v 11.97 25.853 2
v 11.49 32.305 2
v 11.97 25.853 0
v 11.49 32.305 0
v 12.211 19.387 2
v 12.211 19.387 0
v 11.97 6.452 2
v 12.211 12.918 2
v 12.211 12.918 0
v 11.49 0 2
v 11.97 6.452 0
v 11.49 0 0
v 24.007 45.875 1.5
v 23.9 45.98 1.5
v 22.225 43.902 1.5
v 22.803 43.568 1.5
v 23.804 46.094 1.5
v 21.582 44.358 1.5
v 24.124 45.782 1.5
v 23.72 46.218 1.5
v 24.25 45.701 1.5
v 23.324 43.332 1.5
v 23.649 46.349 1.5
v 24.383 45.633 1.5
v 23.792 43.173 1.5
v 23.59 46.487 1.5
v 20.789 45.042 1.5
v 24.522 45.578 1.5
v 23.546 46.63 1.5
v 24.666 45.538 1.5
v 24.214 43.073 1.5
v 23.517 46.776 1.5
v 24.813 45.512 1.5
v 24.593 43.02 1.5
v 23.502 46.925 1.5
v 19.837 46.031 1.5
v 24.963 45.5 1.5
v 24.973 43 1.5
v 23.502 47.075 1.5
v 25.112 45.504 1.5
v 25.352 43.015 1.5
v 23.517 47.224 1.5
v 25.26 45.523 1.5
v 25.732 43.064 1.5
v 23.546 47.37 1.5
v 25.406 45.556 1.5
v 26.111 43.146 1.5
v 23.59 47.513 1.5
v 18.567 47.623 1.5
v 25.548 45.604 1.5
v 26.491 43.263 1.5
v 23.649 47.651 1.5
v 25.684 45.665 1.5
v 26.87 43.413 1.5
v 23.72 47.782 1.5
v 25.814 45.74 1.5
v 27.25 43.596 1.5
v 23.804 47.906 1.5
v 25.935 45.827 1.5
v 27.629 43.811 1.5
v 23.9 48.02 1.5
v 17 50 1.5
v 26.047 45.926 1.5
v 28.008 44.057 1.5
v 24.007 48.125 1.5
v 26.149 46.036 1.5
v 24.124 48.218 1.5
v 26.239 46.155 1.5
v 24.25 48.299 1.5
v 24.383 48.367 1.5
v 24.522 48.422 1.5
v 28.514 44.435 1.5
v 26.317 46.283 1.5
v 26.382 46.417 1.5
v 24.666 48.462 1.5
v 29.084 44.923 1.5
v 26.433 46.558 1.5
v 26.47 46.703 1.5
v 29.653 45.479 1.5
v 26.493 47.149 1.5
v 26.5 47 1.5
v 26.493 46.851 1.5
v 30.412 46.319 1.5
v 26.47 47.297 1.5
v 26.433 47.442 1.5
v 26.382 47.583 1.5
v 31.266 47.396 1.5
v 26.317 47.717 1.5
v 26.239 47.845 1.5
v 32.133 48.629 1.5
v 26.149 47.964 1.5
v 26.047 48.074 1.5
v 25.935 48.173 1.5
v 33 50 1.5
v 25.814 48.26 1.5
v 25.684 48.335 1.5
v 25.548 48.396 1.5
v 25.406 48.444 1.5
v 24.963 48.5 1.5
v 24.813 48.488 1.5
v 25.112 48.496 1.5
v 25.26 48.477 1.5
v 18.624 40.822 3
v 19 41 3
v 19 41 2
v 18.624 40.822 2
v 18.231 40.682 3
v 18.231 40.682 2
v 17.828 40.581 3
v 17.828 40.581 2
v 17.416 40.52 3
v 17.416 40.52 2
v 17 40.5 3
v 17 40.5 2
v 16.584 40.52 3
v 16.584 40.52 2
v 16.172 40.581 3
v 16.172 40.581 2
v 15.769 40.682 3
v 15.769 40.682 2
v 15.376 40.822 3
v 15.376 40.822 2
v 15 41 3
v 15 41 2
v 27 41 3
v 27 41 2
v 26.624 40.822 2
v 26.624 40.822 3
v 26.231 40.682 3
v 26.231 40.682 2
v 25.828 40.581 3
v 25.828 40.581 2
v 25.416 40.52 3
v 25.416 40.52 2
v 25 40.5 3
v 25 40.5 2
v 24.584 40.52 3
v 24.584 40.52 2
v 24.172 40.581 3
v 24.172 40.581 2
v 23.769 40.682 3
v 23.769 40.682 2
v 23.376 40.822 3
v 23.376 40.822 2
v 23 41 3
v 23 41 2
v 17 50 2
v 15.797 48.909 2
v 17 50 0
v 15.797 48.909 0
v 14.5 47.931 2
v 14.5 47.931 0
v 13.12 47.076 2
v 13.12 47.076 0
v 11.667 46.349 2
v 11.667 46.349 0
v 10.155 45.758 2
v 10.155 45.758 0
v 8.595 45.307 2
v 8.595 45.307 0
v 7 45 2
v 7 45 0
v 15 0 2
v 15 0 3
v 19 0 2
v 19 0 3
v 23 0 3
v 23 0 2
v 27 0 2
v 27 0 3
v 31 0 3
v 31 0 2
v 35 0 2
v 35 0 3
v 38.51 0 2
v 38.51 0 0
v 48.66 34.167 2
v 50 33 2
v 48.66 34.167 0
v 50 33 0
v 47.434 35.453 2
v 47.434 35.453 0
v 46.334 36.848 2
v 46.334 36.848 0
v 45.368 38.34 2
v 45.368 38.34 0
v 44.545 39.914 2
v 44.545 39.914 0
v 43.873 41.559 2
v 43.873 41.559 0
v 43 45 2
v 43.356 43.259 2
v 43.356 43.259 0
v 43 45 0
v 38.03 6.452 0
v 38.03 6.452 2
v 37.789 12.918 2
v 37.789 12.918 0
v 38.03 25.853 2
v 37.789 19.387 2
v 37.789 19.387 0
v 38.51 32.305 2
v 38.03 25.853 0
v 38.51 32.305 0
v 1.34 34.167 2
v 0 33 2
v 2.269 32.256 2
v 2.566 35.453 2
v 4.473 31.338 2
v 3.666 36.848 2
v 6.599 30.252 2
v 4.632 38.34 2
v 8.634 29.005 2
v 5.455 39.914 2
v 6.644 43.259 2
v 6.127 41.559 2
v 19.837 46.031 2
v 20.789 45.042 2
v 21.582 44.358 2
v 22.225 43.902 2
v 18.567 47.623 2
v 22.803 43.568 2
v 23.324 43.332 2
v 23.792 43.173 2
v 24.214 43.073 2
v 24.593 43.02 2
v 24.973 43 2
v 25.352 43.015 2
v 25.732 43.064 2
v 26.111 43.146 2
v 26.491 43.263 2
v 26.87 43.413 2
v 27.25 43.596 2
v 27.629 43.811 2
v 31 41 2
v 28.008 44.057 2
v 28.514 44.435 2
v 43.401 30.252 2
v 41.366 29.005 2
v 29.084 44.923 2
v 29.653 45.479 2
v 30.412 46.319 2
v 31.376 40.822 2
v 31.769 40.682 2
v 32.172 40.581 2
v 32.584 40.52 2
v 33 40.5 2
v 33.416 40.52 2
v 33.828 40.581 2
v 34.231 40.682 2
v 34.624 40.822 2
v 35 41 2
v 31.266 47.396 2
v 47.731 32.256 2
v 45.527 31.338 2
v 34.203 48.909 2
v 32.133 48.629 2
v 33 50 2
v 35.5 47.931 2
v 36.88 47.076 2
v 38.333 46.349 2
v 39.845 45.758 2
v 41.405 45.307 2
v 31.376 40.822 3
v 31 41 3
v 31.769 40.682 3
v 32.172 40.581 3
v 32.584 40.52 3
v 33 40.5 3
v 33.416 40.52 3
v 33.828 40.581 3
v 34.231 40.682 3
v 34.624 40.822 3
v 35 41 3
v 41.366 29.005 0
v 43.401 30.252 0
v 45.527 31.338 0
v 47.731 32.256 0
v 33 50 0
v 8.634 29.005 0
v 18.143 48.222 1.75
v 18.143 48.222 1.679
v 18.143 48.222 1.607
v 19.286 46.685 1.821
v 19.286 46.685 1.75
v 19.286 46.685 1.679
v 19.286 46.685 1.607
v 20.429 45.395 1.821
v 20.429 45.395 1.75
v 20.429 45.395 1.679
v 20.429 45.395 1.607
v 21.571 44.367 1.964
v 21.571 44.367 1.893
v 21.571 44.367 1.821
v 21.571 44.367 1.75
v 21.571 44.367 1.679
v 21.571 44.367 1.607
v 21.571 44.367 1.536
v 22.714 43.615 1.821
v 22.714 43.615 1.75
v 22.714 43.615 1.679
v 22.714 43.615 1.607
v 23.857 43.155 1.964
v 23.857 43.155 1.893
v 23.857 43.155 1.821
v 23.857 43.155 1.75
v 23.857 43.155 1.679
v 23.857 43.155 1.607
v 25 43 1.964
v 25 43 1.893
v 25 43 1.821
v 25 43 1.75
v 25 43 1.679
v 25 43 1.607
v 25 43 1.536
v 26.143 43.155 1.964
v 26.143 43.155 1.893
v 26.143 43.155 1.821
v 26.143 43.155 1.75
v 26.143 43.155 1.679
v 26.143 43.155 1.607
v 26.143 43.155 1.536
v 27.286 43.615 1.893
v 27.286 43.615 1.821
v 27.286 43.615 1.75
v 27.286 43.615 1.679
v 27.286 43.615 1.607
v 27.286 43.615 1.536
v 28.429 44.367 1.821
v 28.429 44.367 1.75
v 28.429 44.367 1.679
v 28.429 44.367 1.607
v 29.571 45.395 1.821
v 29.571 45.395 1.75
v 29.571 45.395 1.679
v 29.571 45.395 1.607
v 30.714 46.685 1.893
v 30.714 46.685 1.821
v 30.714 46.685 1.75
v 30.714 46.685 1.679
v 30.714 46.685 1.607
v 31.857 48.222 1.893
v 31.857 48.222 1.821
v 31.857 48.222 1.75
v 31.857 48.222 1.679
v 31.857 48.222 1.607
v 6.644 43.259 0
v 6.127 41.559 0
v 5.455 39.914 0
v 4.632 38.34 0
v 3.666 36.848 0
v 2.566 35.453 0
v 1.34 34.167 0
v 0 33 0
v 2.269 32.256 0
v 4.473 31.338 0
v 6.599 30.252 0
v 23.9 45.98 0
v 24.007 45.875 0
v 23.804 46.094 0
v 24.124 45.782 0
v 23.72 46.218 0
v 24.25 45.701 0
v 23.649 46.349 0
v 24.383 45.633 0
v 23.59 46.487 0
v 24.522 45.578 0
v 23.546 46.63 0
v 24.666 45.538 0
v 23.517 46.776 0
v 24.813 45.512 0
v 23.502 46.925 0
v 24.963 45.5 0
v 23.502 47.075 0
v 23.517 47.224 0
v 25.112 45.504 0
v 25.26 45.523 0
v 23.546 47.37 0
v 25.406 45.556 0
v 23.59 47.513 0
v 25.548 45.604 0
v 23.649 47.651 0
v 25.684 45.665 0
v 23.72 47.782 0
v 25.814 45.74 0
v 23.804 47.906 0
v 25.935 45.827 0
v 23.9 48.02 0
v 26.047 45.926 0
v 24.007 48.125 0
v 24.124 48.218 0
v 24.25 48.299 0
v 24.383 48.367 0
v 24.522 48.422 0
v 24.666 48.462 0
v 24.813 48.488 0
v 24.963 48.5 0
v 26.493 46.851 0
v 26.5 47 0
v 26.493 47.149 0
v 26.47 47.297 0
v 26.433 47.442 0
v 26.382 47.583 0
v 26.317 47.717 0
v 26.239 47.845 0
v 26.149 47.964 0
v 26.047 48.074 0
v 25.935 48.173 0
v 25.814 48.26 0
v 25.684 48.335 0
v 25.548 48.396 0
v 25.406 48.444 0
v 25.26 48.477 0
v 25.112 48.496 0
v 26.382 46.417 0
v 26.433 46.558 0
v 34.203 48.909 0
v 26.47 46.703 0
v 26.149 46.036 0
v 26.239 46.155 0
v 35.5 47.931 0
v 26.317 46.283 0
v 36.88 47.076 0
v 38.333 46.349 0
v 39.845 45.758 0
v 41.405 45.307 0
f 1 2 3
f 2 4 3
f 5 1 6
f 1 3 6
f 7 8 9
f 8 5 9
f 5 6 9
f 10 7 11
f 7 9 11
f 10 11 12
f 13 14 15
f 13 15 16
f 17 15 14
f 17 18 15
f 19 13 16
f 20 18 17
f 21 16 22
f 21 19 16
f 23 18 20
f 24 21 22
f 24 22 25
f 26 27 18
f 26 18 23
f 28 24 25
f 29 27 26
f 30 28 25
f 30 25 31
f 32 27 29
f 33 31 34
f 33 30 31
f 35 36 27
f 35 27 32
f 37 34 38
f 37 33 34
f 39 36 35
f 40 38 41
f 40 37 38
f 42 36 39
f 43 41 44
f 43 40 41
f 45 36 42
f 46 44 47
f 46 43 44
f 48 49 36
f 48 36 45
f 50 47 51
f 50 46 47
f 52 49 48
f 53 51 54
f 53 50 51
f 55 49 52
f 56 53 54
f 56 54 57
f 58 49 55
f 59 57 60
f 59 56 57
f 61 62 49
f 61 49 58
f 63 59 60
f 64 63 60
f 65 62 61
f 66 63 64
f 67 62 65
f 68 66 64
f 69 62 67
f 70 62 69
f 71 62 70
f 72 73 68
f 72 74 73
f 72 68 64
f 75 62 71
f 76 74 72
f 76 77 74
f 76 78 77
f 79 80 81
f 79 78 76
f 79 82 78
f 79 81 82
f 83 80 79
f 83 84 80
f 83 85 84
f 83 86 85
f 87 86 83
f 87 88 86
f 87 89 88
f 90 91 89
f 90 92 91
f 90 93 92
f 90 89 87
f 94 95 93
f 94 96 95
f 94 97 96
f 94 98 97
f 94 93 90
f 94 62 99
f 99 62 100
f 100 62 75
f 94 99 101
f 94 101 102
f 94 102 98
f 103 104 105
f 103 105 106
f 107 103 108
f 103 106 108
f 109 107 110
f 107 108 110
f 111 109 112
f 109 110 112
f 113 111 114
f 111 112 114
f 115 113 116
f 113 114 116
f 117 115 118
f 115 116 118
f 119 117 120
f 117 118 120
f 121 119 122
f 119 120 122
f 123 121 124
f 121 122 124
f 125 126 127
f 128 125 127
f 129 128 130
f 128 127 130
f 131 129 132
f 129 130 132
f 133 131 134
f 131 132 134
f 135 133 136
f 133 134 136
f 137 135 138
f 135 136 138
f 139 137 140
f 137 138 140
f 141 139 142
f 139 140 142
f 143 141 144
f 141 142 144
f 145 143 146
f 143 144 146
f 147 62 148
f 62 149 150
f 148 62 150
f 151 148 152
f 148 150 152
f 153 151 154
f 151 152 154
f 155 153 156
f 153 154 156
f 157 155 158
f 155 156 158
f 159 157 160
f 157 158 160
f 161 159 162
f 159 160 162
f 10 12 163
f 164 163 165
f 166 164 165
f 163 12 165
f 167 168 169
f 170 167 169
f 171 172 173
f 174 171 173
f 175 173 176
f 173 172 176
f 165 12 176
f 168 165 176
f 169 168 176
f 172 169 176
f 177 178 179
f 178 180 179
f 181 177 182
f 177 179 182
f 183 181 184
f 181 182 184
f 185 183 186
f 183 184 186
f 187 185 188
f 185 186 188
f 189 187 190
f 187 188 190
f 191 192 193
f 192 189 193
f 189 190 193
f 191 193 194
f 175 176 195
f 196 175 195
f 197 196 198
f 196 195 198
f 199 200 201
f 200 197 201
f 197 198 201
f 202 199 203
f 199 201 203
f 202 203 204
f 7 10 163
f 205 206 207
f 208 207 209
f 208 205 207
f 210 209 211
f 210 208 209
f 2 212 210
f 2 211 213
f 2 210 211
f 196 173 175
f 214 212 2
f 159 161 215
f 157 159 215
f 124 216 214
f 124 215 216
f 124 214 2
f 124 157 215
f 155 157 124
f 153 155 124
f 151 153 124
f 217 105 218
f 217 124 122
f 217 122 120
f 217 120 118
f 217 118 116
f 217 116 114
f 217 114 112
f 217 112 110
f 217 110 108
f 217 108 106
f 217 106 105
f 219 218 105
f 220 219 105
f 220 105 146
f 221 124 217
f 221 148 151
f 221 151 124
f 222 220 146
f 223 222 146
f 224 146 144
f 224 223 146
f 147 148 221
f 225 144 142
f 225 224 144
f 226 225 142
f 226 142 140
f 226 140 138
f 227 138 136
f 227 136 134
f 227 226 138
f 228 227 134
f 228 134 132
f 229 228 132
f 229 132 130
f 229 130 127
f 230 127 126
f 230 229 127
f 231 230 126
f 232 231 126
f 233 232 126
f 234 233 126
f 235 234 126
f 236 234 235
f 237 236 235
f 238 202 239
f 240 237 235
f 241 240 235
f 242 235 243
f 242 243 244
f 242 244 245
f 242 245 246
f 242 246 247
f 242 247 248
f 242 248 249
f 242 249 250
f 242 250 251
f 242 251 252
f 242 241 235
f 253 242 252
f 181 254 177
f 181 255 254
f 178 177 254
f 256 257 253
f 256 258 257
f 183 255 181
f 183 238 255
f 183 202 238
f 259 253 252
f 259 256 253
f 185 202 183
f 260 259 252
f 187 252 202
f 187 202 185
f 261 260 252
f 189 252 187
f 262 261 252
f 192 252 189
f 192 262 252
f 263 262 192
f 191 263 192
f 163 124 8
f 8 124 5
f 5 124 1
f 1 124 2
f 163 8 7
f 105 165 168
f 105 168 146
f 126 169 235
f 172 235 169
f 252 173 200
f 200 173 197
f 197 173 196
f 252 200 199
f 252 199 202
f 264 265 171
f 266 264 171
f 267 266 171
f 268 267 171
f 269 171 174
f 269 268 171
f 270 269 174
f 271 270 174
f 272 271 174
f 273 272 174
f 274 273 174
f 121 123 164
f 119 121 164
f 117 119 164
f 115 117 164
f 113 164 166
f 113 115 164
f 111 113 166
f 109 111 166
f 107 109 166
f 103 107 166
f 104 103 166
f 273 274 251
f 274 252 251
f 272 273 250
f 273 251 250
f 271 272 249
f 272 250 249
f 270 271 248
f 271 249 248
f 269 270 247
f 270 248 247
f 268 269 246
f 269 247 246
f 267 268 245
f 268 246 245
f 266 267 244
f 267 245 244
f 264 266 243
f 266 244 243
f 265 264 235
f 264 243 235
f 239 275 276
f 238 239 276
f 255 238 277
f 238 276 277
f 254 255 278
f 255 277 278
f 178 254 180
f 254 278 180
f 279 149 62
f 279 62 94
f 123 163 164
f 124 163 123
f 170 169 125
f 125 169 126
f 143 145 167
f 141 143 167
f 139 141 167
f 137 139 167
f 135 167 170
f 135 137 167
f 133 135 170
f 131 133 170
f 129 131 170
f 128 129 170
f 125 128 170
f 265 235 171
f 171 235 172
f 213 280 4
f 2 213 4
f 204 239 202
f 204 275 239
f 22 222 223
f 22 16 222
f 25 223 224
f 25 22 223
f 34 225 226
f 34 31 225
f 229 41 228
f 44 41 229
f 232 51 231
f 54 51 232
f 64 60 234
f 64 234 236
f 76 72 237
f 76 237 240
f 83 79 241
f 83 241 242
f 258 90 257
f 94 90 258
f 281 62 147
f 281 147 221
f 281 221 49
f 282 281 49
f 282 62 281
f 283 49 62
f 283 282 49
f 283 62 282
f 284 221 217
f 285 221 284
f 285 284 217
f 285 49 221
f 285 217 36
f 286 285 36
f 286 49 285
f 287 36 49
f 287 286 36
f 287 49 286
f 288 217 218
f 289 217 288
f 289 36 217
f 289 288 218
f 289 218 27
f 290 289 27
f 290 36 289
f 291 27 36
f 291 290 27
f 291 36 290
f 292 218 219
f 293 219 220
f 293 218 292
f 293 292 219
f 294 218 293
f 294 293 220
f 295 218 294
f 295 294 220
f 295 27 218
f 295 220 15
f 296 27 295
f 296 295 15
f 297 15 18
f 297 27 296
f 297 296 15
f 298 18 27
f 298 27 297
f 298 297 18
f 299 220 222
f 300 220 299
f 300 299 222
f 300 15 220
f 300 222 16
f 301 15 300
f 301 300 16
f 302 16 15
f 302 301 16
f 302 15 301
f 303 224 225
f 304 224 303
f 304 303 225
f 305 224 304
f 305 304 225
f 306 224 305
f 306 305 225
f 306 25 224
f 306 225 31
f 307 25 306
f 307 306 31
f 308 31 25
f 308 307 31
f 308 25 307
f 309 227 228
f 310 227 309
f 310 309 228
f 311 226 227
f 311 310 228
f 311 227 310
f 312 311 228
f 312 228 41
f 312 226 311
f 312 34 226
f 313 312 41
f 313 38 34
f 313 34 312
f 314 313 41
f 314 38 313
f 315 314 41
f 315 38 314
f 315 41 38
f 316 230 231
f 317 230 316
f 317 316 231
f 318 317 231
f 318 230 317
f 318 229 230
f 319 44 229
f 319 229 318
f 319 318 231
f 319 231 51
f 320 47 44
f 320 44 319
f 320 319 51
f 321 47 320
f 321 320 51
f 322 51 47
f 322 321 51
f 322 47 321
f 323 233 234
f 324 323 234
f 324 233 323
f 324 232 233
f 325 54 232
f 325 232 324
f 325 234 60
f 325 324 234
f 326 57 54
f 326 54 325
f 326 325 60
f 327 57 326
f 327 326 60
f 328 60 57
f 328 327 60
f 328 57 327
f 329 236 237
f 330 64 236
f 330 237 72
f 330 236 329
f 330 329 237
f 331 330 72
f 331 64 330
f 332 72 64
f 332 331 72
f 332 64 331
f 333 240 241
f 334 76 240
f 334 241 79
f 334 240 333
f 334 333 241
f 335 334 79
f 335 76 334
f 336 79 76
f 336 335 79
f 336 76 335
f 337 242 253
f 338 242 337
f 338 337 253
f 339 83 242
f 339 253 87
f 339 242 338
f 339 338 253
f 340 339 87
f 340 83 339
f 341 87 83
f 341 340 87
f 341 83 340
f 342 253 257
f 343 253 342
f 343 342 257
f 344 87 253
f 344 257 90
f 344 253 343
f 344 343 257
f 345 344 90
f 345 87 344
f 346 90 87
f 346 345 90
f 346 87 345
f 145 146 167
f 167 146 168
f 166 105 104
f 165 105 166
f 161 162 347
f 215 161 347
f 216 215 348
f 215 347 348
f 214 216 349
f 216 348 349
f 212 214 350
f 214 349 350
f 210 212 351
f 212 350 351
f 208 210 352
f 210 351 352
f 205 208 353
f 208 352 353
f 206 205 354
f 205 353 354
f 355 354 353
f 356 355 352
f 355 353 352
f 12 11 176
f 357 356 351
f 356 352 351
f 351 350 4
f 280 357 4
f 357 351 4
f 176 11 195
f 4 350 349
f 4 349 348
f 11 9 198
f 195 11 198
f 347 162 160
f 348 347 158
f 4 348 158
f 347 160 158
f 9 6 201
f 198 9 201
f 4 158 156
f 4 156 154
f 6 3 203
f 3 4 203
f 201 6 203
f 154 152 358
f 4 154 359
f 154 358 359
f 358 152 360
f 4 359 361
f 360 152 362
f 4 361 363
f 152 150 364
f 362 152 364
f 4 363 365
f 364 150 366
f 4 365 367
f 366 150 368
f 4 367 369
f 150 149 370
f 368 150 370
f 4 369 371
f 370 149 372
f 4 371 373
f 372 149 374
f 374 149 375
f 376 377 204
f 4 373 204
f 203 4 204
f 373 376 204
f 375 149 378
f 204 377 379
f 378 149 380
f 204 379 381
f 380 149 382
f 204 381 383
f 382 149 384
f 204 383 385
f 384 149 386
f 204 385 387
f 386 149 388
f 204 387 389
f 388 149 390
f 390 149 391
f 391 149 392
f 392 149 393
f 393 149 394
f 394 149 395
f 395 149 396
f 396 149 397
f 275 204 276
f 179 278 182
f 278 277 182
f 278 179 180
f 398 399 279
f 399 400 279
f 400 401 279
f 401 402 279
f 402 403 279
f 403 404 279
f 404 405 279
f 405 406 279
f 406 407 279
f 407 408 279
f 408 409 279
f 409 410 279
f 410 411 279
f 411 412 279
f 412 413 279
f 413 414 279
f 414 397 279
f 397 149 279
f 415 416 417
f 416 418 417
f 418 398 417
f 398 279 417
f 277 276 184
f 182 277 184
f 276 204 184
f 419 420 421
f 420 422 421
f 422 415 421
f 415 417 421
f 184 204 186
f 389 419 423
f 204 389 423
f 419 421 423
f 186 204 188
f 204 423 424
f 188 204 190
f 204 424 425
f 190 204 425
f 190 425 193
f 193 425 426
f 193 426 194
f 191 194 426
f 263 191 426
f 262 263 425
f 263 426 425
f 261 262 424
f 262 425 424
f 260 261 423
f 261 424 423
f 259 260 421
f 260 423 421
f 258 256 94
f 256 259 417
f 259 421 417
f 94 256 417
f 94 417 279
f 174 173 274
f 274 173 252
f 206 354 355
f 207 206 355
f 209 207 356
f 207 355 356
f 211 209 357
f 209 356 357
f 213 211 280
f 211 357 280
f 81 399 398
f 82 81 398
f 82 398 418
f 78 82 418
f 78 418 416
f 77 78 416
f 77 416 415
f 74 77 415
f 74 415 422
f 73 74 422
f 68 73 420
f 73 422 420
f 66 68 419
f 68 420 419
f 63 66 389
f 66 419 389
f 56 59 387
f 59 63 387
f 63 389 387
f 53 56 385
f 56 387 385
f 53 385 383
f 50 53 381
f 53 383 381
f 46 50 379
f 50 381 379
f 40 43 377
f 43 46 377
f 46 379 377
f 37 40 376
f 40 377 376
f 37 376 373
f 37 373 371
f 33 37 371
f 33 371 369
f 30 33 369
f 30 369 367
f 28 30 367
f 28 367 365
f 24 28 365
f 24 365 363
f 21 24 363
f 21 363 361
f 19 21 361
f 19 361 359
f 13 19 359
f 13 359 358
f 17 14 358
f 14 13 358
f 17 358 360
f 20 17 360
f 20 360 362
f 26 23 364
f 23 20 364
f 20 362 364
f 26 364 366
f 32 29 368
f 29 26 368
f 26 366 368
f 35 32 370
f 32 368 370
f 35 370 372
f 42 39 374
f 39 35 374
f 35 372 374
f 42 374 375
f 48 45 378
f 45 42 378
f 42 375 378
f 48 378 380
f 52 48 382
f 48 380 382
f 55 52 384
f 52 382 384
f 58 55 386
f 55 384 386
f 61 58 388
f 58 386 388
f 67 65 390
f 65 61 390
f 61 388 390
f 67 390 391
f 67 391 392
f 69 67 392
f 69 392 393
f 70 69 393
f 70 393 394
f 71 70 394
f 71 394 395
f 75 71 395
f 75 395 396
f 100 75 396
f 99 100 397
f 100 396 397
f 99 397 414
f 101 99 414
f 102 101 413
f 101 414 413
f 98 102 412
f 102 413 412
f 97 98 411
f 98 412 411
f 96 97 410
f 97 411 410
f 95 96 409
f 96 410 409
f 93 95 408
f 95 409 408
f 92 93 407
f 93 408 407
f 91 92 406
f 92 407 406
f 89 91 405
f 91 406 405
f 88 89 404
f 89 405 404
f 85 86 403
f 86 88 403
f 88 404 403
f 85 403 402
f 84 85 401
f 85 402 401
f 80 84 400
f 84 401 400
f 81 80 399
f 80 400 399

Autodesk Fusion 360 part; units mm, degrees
sketch "Boceto1" plane through (0, 0, 0) normal (0, 0, 1) x (1, 0, 0)
  spline S0 degree 5 poles (17, 50) (17.32, 49.4691) (17.96, 48.4536) (18.92, 47.0694) (20.2, 45.5067) (21.8, 44.0566) (23.4, 43.1548) (25, 42.846) (26.6, 43.1548) (28.2, 44.0566) (29.8, 45.5067) (31.08, 47.0694) (32.04, 48.4536) (32.68, 49.4691) (33, 50) knots 0 0 0 0 0 0 0.1 0.2 0.3 0.4 0.5 0.6 0.7 0.8 0.9 1 1 1 1 1 1
  line L0 (25, 43) -> (25, 0) construction
  arc A0 (7, 45) -> (17, 50) centre (4.4264, 62.6472) ccw
  arc A1 (0, 33) -> (7, 45) centre (-11.8333, 47.9444) ccw
  arc A2 (8.6345, 29.0047) -> (0, 33) centre (-8.4336, 3.4454) ccw
  line L1 (8.6345, 29.0047) -> (11.4903, 32.3049)
  arc A3 (11.4903, 0) -> (11.4903, 32.3049) centre (-162.0039, 16.1524) ccw
  arc A4 (33, 50) -> (43, 45) centre (45.5736, 62.6472) ccw
  arc A5 (43, 45) -> (50, 33) centre (61.8333, 47.9444) ccw
  arc A6 (50, 33) -> (41.3655, 29.0047) centre (58.4336, 3.4454) ccw
  line L2 (41.3655, 29.0047) -> (38.5097, 32.3049)
  arc A7 (38.5097, 32.3049) -> (38.5097, 0) centre (212.0039, 16.1524) ccw
  line L3 (17, 50) -> (33, 50)
  circle A8 centre (25, 47) radius 1.5
  line L4 (18, 0) -> (15, 0)
  line L5 (19, 41) -> (19, 0)
  line L6 (19, 0) -> (15, 0)
  line L7 (15, 0) -> (15, 41)
  line L8 (23, 41) -> (23, 0)
  line L9 (23, 0) -> (27, 0)
  line L10 (27, 0) -> (27, 41)
  line L11 (31, 41) -> (31, 0)
  line L12 (31, 0) -> (35, 0)
  line L13 (35, 0) -> (35, 41)
  arc A9 (23, 41) -> (27, 41) centre (25, 44.75) ccw
  arc A10 (15, 41) -> (19, 41) centre (17, 44.75) ccw
  arc A11 (31, 41) -> (35, 41) centre (33, 44.75) ccw
  line L14 (11.4903, 0) -> (38.5097, 0)
  point P0 (25, 43)
  dimension "d10" = 3
  dimension "d11" = 4
  dimension "d12" = 4
  dimension "d15" = 4
  dimension "d16" = 4
  dimension "d17" = 4
  dimension "d18" = 174.2445
  dimension "d19" = 19.0621
  dimension "d20" = 30.7343
  dimension "d21" = 17.8339
  dimension "d22" = 4.25
  dimension "d23" = 2
  dimension "d24" = 1
  dimension "d25" = 8.4336
  dimension "d26" = 3.4454
  dimension "d27" = 33.4336
  dimension "d28" = 46.5546
  dimension "d29" = 43.5546
  dimension "d30" = 39.5546
  dimension "d31" = 40.871
  dimension "d32" = 220.4376
  dimension "d33" = 70.267
  dimension "d34" = 59.2018
  dimension "d35" = 49.7991
extrude "Extruir1" add sketch "Boceto1" along normal blind 2 contours S0 A0 A1 A2 L1 A3 A4 A5 A6 L2 A7 L5 L7 L8 L10 L11 L13 A9 A10 A11 L14
extrude "Extruir2" add sketch "Boceto1" along normal blind 3 contours L4 L5 L6 L7 A10 L14
extrude "Extruir3" add sketch "Boceto1" along normal blind 3 contours L8 L9 L10 A9 L14
extrude "Extruir4" add sketch "Boceto1" along normal blind 3 contours L11 L12 L13 A11 L14
extrude "Extruir5" add sketch "Boceto1" along normal blind 1.5 contours S0 L3
